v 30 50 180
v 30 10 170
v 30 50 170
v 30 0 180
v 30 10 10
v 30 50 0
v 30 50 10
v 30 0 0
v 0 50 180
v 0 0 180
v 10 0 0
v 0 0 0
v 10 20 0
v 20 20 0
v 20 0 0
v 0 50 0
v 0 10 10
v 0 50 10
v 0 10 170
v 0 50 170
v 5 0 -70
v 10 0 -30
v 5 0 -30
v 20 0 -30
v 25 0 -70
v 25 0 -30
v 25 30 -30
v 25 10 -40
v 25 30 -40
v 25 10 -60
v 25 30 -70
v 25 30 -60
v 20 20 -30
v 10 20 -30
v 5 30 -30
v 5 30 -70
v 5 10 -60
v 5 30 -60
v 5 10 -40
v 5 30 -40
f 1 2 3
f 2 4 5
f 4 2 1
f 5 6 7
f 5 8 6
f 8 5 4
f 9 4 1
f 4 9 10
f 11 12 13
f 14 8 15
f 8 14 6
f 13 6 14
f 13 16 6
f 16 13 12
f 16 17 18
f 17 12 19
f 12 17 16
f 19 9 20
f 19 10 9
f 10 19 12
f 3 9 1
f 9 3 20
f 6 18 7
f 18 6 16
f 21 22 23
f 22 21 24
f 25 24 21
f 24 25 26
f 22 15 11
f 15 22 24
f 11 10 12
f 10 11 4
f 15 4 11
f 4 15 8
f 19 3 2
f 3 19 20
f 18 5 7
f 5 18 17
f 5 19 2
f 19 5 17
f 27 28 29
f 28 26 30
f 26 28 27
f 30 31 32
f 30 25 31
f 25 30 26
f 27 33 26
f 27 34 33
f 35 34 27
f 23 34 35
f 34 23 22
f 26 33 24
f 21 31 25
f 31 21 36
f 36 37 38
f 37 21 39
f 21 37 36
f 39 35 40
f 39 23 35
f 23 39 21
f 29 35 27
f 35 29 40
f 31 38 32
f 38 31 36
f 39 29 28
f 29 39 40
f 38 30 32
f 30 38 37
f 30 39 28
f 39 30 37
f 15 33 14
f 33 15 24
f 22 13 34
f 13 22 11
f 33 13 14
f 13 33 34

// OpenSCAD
boxHeight=160;
clampWidth=30;
clampDepth=40;
wallThickness=10;

heightOffDesk = 30;
deskHeight = 20;
deskDepth = 20;
deskWidth = 20;

difference() {
    cube([clampWidth, clampDepth + wallThickness, boxHeight + 2 * wallThickness]);
    translate([-0.01, wallThickness, wallThickness]) {
        cube([clampWidth + 0.02, clampDepth + 0.01, boxHeight]);
    }
}
translate([clampWidth / 2 - wallThickness / 2, 0, -heightOffDesk]) {
    cube([wallThickness, clampDepth / 2, heightOffDesk]);
}
translate([clampWidth /2 - deskWidth / 2, 0,-heightOffDesk - deskHeight - 2 * wallThickness]) {
    difference() {
        cube([deskWidth, deskDepth + wallThickness, deskHeight + 2 * wallThickness]);
        translate([-0.01, wallThickness, wallThickness]) {
            cube([deskWidth + 0.02, deskDepth + 0.01, deskHeight]);
        }
    }
}   
